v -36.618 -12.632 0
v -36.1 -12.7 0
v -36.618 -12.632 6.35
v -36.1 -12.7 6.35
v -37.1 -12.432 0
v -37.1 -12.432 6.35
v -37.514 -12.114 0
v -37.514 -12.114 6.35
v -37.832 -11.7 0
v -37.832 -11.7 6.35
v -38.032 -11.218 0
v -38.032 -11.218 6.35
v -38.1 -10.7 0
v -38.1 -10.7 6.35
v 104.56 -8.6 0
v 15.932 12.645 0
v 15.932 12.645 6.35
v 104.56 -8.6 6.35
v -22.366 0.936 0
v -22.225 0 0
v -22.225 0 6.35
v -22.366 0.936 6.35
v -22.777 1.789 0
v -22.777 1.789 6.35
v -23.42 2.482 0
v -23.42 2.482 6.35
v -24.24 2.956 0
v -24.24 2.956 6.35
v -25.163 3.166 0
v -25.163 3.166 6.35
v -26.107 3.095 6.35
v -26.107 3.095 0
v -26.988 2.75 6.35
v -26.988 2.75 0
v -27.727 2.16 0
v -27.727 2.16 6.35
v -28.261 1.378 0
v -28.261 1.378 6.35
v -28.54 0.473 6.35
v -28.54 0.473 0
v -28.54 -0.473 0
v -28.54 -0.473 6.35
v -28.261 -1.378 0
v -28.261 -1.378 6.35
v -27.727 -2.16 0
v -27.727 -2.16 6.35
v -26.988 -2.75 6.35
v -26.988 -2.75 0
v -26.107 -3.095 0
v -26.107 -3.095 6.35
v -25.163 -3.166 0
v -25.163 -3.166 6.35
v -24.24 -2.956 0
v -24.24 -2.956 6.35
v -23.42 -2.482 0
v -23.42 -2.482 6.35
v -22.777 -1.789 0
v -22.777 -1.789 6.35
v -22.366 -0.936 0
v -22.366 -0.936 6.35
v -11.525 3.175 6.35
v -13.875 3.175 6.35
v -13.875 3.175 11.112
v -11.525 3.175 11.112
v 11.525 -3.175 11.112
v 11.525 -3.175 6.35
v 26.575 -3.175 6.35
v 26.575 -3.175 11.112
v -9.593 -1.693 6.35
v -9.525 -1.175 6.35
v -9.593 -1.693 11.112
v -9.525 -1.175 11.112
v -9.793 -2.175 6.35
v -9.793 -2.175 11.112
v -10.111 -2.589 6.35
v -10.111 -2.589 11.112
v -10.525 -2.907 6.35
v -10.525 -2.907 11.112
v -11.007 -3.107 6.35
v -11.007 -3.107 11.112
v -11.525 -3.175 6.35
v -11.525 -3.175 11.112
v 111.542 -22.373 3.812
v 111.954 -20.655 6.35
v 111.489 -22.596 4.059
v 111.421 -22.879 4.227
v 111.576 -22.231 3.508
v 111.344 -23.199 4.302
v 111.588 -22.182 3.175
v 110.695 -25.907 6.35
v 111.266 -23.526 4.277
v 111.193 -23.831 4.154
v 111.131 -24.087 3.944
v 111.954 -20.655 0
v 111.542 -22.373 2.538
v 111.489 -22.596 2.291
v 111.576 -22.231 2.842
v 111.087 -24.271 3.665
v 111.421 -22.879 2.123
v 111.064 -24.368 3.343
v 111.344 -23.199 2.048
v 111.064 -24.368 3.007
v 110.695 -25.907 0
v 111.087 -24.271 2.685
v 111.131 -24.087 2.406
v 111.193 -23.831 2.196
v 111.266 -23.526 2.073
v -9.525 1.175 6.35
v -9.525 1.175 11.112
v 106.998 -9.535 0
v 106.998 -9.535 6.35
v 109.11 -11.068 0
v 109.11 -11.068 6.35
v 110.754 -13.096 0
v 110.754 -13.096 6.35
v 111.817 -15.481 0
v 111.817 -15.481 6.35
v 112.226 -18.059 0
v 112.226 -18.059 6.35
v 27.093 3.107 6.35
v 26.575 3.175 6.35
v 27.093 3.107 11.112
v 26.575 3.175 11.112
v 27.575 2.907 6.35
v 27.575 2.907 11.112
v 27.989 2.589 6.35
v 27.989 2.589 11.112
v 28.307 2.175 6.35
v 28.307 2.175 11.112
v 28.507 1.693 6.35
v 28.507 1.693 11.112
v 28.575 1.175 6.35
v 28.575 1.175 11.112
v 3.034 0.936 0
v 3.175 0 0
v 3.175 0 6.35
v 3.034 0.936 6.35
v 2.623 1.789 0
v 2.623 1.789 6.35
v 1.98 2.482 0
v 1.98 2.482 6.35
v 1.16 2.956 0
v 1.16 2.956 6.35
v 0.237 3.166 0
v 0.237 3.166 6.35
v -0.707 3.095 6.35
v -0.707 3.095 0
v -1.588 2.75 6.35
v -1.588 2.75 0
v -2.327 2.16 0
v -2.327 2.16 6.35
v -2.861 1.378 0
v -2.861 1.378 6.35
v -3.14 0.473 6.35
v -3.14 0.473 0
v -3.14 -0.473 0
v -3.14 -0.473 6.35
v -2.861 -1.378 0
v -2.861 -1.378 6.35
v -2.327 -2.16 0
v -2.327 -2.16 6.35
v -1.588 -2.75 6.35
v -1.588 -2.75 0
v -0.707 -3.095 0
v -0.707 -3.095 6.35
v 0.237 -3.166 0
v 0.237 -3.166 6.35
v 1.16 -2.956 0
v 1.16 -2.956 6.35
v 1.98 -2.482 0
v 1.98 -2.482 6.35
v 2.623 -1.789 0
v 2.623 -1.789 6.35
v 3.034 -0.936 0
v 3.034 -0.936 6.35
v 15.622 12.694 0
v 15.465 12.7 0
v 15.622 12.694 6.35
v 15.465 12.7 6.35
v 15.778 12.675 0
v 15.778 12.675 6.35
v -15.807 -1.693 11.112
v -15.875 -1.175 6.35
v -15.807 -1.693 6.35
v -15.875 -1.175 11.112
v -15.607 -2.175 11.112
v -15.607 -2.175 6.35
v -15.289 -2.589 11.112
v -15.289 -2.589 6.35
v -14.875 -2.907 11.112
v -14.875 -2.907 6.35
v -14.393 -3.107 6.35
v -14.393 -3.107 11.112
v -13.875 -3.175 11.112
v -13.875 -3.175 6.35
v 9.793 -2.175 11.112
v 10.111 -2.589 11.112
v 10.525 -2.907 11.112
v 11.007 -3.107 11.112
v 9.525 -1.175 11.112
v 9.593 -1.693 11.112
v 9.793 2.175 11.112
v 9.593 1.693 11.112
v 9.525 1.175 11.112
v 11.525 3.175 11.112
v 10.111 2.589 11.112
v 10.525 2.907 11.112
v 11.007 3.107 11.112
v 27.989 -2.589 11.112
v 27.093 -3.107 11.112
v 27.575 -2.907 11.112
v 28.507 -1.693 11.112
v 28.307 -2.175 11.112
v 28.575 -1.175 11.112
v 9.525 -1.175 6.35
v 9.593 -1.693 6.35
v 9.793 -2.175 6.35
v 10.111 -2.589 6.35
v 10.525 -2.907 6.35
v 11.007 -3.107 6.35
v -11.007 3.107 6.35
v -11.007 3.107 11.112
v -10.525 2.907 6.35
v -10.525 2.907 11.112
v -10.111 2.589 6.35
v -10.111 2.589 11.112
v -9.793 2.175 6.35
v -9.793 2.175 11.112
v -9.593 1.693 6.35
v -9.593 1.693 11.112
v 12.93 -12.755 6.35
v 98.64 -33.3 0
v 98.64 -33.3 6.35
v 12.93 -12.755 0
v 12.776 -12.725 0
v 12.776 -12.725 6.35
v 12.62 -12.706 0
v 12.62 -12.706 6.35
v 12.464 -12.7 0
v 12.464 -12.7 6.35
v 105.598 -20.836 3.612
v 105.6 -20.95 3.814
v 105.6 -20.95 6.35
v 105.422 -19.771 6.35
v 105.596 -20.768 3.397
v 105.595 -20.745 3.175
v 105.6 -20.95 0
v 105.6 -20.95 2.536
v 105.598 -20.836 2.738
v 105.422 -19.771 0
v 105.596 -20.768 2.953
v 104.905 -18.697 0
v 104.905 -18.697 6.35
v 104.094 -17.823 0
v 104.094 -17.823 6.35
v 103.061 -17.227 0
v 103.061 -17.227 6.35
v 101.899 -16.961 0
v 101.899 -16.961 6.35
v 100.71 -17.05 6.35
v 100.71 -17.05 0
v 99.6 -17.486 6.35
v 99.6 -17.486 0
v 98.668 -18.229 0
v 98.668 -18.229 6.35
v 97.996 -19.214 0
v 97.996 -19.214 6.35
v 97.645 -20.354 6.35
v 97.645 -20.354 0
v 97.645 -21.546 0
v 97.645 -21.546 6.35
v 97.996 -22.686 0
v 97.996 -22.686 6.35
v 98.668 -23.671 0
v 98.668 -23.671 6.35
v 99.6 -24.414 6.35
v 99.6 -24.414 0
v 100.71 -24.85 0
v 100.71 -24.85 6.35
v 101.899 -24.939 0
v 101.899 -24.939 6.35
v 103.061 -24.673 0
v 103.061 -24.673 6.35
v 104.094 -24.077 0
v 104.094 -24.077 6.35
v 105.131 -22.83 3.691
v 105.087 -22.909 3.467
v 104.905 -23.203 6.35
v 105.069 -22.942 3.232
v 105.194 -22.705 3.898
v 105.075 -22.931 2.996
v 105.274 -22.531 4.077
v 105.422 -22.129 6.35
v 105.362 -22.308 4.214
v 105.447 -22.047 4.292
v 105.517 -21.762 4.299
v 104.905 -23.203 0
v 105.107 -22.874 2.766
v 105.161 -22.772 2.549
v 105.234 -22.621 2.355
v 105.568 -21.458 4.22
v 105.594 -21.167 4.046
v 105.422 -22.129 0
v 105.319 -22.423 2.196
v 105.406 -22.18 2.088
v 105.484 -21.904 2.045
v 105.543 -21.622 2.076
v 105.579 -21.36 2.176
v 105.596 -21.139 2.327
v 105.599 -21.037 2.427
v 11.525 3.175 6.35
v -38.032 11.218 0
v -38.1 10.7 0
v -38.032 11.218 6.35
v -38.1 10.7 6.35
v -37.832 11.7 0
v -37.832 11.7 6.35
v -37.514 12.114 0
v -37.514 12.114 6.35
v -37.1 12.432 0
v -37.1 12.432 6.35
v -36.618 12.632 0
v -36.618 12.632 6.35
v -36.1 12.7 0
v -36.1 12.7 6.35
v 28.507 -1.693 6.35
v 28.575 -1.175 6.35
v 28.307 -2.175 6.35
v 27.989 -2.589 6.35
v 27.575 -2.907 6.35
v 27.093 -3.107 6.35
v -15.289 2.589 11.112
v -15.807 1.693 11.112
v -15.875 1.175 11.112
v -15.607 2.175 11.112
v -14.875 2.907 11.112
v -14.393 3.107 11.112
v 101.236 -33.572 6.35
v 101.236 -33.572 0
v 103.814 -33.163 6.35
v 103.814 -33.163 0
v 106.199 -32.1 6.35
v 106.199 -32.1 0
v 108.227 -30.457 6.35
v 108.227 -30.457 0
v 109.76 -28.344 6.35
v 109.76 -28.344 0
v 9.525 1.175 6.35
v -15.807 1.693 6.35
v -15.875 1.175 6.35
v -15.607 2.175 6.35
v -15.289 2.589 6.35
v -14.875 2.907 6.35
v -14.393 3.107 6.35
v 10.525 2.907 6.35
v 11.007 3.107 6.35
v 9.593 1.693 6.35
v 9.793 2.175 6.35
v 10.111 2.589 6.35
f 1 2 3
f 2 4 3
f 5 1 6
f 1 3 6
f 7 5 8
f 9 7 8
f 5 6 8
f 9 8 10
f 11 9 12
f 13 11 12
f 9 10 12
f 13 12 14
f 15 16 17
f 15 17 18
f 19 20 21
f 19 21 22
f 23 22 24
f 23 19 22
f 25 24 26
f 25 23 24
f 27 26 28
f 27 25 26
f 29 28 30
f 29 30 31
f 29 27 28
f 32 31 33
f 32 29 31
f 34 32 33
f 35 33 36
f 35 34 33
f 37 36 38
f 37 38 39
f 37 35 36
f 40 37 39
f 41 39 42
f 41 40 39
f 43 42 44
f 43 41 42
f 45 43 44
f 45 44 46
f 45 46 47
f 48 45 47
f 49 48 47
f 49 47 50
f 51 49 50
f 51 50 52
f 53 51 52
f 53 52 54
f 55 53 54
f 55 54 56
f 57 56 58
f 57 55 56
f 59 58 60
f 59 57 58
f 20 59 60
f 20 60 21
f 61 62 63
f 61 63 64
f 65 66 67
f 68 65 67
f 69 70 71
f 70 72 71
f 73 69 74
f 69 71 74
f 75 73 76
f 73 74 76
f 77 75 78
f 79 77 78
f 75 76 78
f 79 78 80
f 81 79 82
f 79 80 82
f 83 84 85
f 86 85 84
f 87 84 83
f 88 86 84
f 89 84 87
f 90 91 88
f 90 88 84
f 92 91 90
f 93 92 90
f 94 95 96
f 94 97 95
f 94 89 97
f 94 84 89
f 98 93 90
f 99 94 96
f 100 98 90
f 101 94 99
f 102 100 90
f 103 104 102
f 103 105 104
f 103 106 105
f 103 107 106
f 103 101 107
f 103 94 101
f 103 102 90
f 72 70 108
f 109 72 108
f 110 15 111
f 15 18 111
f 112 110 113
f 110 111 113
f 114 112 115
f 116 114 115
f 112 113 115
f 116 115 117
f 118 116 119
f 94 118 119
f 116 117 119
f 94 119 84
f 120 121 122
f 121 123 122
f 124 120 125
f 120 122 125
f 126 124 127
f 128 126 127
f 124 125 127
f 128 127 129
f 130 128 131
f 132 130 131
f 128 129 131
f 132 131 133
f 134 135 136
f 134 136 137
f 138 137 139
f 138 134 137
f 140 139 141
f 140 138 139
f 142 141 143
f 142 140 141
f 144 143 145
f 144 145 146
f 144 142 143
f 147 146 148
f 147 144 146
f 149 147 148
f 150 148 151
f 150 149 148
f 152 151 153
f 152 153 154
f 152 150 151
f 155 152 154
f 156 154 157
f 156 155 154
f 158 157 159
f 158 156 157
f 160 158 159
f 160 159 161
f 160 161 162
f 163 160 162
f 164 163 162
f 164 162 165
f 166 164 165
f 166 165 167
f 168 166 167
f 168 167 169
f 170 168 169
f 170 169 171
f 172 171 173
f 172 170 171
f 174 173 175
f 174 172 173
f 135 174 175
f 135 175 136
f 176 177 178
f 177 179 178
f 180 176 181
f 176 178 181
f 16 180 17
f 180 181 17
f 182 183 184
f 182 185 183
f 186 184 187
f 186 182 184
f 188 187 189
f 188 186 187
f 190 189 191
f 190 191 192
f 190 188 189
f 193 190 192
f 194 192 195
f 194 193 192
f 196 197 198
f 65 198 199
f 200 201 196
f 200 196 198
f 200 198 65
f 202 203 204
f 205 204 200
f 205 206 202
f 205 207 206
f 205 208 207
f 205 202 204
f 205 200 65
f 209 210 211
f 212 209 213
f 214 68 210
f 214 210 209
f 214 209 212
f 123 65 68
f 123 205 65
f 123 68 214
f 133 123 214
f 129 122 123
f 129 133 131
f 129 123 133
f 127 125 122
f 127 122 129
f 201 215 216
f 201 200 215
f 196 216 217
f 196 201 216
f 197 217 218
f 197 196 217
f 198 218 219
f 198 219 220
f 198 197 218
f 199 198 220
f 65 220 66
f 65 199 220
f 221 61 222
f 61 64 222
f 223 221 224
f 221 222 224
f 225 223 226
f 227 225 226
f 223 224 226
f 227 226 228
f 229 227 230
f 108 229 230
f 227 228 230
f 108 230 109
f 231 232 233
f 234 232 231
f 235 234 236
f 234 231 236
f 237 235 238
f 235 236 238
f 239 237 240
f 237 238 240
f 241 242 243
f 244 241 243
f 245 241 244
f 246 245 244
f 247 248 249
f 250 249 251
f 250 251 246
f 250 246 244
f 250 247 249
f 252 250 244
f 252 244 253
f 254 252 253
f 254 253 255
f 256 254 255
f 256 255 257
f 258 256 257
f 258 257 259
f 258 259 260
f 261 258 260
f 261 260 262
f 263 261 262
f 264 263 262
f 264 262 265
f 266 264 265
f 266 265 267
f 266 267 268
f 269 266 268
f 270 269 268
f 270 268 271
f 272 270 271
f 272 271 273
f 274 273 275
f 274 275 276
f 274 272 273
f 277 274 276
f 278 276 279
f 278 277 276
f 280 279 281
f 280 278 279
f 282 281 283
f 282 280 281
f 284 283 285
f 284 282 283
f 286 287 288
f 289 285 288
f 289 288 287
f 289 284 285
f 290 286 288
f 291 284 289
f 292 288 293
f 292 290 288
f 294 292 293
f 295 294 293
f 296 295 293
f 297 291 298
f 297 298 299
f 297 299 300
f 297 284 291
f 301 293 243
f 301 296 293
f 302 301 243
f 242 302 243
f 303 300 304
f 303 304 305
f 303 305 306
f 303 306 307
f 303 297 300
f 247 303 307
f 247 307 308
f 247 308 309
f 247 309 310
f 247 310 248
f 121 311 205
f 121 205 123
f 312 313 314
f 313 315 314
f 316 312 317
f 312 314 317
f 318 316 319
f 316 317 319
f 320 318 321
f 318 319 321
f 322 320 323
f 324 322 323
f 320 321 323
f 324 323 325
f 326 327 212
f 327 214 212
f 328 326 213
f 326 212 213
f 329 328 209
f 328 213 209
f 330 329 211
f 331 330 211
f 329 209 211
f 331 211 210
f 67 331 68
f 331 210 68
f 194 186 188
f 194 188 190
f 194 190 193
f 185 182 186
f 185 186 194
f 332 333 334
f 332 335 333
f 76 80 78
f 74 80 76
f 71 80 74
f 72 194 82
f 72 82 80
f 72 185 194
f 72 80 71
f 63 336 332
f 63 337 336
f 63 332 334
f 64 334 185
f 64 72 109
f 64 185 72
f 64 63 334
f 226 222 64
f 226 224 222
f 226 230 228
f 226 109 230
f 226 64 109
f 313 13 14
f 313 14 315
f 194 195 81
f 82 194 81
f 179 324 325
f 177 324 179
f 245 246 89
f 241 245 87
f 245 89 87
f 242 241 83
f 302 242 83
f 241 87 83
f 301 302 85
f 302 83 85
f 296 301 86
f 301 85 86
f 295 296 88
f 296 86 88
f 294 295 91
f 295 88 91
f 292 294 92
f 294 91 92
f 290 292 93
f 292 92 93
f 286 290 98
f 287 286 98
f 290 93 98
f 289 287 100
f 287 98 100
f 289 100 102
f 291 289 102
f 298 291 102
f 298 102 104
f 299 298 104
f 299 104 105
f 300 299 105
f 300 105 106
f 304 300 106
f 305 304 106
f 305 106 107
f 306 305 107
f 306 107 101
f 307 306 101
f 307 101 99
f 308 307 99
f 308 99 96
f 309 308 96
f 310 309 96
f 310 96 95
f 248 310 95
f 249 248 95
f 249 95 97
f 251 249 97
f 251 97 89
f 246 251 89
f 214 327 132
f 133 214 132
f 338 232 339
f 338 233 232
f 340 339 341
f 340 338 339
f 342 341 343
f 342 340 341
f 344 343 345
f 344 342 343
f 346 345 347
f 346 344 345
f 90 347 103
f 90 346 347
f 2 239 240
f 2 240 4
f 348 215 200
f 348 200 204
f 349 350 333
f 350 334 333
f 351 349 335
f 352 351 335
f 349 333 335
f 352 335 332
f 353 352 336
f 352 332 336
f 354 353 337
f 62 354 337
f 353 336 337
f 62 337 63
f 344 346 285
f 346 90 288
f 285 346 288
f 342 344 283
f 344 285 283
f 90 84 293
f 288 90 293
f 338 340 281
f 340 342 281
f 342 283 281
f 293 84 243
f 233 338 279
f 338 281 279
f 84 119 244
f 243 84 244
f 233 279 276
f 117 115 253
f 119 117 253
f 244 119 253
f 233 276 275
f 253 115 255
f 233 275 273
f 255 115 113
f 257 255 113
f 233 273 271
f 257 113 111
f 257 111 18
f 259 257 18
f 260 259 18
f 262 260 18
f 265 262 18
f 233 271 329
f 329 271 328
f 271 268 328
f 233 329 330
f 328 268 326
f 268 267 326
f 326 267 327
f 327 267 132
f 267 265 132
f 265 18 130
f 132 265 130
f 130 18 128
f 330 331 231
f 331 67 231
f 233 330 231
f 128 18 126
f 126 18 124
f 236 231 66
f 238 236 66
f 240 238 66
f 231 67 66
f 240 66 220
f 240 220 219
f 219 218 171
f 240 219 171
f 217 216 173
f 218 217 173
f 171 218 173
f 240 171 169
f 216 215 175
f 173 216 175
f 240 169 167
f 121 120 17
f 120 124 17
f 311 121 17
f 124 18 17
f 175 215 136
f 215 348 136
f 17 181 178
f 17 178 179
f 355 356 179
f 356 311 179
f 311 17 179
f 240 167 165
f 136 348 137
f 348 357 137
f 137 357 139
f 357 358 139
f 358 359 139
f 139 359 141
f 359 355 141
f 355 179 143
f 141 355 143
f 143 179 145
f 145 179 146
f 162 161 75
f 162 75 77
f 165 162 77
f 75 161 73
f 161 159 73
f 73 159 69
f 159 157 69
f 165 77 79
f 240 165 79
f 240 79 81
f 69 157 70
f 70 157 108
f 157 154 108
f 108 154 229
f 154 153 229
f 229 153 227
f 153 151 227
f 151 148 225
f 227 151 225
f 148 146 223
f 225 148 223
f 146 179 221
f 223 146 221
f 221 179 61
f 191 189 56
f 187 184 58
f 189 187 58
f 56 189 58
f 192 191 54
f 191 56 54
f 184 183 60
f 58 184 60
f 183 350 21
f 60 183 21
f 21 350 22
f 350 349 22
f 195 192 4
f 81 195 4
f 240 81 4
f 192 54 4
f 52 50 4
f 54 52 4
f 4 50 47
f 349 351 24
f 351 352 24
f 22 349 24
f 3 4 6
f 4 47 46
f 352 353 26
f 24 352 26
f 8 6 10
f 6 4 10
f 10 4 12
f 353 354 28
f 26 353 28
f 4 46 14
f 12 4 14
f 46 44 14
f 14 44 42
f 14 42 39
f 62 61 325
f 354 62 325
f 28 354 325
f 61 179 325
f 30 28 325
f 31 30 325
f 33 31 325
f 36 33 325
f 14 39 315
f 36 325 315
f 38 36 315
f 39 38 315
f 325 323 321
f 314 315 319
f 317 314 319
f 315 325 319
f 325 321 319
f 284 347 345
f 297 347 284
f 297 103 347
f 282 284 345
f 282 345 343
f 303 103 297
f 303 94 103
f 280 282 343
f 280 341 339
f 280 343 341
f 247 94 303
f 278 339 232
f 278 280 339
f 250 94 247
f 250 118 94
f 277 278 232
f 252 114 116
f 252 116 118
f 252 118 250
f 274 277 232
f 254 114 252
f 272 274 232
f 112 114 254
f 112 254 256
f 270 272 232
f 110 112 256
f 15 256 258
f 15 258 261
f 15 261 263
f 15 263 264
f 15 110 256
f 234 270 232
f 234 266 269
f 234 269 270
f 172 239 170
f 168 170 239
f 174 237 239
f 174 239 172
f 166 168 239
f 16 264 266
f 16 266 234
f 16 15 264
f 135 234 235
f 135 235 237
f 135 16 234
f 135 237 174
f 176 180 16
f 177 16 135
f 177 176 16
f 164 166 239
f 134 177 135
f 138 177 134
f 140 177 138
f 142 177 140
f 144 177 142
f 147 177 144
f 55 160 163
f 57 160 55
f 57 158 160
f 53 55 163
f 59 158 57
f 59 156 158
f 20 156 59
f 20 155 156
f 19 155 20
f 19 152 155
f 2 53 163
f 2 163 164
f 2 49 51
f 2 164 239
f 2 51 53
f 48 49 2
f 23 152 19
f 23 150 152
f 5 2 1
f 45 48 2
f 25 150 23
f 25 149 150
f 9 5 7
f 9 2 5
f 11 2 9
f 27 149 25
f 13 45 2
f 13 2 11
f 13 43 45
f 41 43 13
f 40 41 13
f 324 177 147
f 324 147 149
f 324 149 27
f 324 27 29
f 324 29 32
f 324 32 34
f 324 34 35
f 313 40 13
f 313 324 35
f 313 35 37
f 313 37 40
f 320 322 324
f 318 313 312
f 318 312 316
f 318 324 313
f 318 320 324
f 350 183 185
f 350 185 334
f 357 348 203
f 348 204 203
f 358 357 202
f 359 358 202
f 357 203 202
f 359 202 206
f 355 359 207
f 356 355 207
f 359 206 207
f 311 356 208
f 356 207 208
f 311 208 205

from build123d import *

# Parameters (mm, degrees)
SKETCH1_R               = 3.175
SKETCH1_R_2             = 4
BOSS_EXTRUDE1_DEPTH     = 6.35
CUT_EXTRUDE2_REACH      = 155.866
CUT_EXTRUDE2_END_RADIUS = 4
SKETCH3_R               = 1.1303
FILLET4_R               = 10
SKETCH4_W               = 6.35
SKETCH4_H               = 6.35
SKETCH4_W_2             = 19.05
BOSS_EXTRUDE2_DEPTH     = 4.7625
FILLET3_R               = 2


with BuildPart() as part:
    # Sketch1 → Boss-Extrude1 (new body)
    with BuildSketch(Plane.XY):
        Polygon((-38.1, -12.7), (-38.1, 12.7), (15.701735639, 12.7), (114.28491418, -10.930870684), (108.364133554, -35.631161305), (12.7, -12.7), align=None)
        with Locations((-25.4, 0)):
            Circle(SKETCH1_R, mode=Mode.SUBTRACT)
        Circle(SKETCH1_R, mode=Mode.SUBTRACT)
        with Locations((101.6, -20.95)):
            Circle(SKETCH1_R_2, mode=Mode.SUBTRACT)
    extrude(amount=BOSS_EXTRUDE1_DEPTH)

    # Cut-Extrude2: up to this cylinder (the profile starts outside it)
    cut_extrude2_end = Plane(origin=(101.6, -20.95, 3.175), z_dir=(0, 0, -1)) * Cylinder(CUT_EXTRUDE2_END_RADIUS, 320.732, mode=Mode.PRIVATE)
    # Sketch3 → Cut-Extrude2 (cut, up to the surface)
    with BuildSketch(Plane(origin=(110.552900462, -26.500071647, 0), x_dir=(0, 0, -1), z_dir=(0.9724523866696595, -0.23310159943784806, 0)), mode=Mode.PRIVATE) as cut_extrude2_sk1:
        with Locations(Location((-3.175, 3.310245002, 0), (0, 0, 90))):
            Circle(SKETCH3_R)
    cut_extrude2_tool1 = extrude(cut_extrude2_sk1.sketch, amount=-CUT_EXTRUDE2_REACH, mode=Mode.PRIVATE) - cut_extrude2_end
    add(cut_extrude2_tool1.solids().sort_by_distance((111.324524, -23.281016, 3.175))[0], mode=Mode.SUBTRACT)

    # Fillet4
    fillet4_edges = [part.edges().sort_by_distance(p)[0] for p in [
        (108.364133554, -35.631161305, 3.175),
        (114.28491418, -10.930870684, 3.175),
    ]]
    fillet(fillet4_edges, radius=FILLET4_R)

    # Sketch4 → Boss-Extrude2 (add)
    with BuildSketch(Plane.XY.offset(6.35)):
        with Locations((-12.7, 0)):
            Rectangle(SKETCH4_W, SKETCH4_H)
        with Locations((19.05, 0)):
            Rectangle(SKETCH4_W_2, SKETCH4_H)
    extrude(amount=BOSS_EXTRUDE2_DEPTH)

    # Fillet3
    fillet3_edges = [part.edges().sort_by_distance(p)[0] for p in [
        (12.7, -12.7, 3.175),
        (-38.1, -12.7, 3.175),
        (-38.1, 12.7, 3.175),
        (15.701735639, 12.7, 3.175),
        (-15.875, -3.175, 8.73125),
        (-9.525, -3.175, 8.73125),
        (-9.525, 3.175, 8.73125),
        (-15.875, 3.175, 8.73125),
        (9.525, -3.175, 8.73125),
        (28.575, -3.175, 8.73125),
        (28.575, 3.175, 8.73125),
        (9.525, 3.175, 8.73125),
    ]]
    fillet(fillet3_edges, radius=FILLET3_R)


solid = part.part
